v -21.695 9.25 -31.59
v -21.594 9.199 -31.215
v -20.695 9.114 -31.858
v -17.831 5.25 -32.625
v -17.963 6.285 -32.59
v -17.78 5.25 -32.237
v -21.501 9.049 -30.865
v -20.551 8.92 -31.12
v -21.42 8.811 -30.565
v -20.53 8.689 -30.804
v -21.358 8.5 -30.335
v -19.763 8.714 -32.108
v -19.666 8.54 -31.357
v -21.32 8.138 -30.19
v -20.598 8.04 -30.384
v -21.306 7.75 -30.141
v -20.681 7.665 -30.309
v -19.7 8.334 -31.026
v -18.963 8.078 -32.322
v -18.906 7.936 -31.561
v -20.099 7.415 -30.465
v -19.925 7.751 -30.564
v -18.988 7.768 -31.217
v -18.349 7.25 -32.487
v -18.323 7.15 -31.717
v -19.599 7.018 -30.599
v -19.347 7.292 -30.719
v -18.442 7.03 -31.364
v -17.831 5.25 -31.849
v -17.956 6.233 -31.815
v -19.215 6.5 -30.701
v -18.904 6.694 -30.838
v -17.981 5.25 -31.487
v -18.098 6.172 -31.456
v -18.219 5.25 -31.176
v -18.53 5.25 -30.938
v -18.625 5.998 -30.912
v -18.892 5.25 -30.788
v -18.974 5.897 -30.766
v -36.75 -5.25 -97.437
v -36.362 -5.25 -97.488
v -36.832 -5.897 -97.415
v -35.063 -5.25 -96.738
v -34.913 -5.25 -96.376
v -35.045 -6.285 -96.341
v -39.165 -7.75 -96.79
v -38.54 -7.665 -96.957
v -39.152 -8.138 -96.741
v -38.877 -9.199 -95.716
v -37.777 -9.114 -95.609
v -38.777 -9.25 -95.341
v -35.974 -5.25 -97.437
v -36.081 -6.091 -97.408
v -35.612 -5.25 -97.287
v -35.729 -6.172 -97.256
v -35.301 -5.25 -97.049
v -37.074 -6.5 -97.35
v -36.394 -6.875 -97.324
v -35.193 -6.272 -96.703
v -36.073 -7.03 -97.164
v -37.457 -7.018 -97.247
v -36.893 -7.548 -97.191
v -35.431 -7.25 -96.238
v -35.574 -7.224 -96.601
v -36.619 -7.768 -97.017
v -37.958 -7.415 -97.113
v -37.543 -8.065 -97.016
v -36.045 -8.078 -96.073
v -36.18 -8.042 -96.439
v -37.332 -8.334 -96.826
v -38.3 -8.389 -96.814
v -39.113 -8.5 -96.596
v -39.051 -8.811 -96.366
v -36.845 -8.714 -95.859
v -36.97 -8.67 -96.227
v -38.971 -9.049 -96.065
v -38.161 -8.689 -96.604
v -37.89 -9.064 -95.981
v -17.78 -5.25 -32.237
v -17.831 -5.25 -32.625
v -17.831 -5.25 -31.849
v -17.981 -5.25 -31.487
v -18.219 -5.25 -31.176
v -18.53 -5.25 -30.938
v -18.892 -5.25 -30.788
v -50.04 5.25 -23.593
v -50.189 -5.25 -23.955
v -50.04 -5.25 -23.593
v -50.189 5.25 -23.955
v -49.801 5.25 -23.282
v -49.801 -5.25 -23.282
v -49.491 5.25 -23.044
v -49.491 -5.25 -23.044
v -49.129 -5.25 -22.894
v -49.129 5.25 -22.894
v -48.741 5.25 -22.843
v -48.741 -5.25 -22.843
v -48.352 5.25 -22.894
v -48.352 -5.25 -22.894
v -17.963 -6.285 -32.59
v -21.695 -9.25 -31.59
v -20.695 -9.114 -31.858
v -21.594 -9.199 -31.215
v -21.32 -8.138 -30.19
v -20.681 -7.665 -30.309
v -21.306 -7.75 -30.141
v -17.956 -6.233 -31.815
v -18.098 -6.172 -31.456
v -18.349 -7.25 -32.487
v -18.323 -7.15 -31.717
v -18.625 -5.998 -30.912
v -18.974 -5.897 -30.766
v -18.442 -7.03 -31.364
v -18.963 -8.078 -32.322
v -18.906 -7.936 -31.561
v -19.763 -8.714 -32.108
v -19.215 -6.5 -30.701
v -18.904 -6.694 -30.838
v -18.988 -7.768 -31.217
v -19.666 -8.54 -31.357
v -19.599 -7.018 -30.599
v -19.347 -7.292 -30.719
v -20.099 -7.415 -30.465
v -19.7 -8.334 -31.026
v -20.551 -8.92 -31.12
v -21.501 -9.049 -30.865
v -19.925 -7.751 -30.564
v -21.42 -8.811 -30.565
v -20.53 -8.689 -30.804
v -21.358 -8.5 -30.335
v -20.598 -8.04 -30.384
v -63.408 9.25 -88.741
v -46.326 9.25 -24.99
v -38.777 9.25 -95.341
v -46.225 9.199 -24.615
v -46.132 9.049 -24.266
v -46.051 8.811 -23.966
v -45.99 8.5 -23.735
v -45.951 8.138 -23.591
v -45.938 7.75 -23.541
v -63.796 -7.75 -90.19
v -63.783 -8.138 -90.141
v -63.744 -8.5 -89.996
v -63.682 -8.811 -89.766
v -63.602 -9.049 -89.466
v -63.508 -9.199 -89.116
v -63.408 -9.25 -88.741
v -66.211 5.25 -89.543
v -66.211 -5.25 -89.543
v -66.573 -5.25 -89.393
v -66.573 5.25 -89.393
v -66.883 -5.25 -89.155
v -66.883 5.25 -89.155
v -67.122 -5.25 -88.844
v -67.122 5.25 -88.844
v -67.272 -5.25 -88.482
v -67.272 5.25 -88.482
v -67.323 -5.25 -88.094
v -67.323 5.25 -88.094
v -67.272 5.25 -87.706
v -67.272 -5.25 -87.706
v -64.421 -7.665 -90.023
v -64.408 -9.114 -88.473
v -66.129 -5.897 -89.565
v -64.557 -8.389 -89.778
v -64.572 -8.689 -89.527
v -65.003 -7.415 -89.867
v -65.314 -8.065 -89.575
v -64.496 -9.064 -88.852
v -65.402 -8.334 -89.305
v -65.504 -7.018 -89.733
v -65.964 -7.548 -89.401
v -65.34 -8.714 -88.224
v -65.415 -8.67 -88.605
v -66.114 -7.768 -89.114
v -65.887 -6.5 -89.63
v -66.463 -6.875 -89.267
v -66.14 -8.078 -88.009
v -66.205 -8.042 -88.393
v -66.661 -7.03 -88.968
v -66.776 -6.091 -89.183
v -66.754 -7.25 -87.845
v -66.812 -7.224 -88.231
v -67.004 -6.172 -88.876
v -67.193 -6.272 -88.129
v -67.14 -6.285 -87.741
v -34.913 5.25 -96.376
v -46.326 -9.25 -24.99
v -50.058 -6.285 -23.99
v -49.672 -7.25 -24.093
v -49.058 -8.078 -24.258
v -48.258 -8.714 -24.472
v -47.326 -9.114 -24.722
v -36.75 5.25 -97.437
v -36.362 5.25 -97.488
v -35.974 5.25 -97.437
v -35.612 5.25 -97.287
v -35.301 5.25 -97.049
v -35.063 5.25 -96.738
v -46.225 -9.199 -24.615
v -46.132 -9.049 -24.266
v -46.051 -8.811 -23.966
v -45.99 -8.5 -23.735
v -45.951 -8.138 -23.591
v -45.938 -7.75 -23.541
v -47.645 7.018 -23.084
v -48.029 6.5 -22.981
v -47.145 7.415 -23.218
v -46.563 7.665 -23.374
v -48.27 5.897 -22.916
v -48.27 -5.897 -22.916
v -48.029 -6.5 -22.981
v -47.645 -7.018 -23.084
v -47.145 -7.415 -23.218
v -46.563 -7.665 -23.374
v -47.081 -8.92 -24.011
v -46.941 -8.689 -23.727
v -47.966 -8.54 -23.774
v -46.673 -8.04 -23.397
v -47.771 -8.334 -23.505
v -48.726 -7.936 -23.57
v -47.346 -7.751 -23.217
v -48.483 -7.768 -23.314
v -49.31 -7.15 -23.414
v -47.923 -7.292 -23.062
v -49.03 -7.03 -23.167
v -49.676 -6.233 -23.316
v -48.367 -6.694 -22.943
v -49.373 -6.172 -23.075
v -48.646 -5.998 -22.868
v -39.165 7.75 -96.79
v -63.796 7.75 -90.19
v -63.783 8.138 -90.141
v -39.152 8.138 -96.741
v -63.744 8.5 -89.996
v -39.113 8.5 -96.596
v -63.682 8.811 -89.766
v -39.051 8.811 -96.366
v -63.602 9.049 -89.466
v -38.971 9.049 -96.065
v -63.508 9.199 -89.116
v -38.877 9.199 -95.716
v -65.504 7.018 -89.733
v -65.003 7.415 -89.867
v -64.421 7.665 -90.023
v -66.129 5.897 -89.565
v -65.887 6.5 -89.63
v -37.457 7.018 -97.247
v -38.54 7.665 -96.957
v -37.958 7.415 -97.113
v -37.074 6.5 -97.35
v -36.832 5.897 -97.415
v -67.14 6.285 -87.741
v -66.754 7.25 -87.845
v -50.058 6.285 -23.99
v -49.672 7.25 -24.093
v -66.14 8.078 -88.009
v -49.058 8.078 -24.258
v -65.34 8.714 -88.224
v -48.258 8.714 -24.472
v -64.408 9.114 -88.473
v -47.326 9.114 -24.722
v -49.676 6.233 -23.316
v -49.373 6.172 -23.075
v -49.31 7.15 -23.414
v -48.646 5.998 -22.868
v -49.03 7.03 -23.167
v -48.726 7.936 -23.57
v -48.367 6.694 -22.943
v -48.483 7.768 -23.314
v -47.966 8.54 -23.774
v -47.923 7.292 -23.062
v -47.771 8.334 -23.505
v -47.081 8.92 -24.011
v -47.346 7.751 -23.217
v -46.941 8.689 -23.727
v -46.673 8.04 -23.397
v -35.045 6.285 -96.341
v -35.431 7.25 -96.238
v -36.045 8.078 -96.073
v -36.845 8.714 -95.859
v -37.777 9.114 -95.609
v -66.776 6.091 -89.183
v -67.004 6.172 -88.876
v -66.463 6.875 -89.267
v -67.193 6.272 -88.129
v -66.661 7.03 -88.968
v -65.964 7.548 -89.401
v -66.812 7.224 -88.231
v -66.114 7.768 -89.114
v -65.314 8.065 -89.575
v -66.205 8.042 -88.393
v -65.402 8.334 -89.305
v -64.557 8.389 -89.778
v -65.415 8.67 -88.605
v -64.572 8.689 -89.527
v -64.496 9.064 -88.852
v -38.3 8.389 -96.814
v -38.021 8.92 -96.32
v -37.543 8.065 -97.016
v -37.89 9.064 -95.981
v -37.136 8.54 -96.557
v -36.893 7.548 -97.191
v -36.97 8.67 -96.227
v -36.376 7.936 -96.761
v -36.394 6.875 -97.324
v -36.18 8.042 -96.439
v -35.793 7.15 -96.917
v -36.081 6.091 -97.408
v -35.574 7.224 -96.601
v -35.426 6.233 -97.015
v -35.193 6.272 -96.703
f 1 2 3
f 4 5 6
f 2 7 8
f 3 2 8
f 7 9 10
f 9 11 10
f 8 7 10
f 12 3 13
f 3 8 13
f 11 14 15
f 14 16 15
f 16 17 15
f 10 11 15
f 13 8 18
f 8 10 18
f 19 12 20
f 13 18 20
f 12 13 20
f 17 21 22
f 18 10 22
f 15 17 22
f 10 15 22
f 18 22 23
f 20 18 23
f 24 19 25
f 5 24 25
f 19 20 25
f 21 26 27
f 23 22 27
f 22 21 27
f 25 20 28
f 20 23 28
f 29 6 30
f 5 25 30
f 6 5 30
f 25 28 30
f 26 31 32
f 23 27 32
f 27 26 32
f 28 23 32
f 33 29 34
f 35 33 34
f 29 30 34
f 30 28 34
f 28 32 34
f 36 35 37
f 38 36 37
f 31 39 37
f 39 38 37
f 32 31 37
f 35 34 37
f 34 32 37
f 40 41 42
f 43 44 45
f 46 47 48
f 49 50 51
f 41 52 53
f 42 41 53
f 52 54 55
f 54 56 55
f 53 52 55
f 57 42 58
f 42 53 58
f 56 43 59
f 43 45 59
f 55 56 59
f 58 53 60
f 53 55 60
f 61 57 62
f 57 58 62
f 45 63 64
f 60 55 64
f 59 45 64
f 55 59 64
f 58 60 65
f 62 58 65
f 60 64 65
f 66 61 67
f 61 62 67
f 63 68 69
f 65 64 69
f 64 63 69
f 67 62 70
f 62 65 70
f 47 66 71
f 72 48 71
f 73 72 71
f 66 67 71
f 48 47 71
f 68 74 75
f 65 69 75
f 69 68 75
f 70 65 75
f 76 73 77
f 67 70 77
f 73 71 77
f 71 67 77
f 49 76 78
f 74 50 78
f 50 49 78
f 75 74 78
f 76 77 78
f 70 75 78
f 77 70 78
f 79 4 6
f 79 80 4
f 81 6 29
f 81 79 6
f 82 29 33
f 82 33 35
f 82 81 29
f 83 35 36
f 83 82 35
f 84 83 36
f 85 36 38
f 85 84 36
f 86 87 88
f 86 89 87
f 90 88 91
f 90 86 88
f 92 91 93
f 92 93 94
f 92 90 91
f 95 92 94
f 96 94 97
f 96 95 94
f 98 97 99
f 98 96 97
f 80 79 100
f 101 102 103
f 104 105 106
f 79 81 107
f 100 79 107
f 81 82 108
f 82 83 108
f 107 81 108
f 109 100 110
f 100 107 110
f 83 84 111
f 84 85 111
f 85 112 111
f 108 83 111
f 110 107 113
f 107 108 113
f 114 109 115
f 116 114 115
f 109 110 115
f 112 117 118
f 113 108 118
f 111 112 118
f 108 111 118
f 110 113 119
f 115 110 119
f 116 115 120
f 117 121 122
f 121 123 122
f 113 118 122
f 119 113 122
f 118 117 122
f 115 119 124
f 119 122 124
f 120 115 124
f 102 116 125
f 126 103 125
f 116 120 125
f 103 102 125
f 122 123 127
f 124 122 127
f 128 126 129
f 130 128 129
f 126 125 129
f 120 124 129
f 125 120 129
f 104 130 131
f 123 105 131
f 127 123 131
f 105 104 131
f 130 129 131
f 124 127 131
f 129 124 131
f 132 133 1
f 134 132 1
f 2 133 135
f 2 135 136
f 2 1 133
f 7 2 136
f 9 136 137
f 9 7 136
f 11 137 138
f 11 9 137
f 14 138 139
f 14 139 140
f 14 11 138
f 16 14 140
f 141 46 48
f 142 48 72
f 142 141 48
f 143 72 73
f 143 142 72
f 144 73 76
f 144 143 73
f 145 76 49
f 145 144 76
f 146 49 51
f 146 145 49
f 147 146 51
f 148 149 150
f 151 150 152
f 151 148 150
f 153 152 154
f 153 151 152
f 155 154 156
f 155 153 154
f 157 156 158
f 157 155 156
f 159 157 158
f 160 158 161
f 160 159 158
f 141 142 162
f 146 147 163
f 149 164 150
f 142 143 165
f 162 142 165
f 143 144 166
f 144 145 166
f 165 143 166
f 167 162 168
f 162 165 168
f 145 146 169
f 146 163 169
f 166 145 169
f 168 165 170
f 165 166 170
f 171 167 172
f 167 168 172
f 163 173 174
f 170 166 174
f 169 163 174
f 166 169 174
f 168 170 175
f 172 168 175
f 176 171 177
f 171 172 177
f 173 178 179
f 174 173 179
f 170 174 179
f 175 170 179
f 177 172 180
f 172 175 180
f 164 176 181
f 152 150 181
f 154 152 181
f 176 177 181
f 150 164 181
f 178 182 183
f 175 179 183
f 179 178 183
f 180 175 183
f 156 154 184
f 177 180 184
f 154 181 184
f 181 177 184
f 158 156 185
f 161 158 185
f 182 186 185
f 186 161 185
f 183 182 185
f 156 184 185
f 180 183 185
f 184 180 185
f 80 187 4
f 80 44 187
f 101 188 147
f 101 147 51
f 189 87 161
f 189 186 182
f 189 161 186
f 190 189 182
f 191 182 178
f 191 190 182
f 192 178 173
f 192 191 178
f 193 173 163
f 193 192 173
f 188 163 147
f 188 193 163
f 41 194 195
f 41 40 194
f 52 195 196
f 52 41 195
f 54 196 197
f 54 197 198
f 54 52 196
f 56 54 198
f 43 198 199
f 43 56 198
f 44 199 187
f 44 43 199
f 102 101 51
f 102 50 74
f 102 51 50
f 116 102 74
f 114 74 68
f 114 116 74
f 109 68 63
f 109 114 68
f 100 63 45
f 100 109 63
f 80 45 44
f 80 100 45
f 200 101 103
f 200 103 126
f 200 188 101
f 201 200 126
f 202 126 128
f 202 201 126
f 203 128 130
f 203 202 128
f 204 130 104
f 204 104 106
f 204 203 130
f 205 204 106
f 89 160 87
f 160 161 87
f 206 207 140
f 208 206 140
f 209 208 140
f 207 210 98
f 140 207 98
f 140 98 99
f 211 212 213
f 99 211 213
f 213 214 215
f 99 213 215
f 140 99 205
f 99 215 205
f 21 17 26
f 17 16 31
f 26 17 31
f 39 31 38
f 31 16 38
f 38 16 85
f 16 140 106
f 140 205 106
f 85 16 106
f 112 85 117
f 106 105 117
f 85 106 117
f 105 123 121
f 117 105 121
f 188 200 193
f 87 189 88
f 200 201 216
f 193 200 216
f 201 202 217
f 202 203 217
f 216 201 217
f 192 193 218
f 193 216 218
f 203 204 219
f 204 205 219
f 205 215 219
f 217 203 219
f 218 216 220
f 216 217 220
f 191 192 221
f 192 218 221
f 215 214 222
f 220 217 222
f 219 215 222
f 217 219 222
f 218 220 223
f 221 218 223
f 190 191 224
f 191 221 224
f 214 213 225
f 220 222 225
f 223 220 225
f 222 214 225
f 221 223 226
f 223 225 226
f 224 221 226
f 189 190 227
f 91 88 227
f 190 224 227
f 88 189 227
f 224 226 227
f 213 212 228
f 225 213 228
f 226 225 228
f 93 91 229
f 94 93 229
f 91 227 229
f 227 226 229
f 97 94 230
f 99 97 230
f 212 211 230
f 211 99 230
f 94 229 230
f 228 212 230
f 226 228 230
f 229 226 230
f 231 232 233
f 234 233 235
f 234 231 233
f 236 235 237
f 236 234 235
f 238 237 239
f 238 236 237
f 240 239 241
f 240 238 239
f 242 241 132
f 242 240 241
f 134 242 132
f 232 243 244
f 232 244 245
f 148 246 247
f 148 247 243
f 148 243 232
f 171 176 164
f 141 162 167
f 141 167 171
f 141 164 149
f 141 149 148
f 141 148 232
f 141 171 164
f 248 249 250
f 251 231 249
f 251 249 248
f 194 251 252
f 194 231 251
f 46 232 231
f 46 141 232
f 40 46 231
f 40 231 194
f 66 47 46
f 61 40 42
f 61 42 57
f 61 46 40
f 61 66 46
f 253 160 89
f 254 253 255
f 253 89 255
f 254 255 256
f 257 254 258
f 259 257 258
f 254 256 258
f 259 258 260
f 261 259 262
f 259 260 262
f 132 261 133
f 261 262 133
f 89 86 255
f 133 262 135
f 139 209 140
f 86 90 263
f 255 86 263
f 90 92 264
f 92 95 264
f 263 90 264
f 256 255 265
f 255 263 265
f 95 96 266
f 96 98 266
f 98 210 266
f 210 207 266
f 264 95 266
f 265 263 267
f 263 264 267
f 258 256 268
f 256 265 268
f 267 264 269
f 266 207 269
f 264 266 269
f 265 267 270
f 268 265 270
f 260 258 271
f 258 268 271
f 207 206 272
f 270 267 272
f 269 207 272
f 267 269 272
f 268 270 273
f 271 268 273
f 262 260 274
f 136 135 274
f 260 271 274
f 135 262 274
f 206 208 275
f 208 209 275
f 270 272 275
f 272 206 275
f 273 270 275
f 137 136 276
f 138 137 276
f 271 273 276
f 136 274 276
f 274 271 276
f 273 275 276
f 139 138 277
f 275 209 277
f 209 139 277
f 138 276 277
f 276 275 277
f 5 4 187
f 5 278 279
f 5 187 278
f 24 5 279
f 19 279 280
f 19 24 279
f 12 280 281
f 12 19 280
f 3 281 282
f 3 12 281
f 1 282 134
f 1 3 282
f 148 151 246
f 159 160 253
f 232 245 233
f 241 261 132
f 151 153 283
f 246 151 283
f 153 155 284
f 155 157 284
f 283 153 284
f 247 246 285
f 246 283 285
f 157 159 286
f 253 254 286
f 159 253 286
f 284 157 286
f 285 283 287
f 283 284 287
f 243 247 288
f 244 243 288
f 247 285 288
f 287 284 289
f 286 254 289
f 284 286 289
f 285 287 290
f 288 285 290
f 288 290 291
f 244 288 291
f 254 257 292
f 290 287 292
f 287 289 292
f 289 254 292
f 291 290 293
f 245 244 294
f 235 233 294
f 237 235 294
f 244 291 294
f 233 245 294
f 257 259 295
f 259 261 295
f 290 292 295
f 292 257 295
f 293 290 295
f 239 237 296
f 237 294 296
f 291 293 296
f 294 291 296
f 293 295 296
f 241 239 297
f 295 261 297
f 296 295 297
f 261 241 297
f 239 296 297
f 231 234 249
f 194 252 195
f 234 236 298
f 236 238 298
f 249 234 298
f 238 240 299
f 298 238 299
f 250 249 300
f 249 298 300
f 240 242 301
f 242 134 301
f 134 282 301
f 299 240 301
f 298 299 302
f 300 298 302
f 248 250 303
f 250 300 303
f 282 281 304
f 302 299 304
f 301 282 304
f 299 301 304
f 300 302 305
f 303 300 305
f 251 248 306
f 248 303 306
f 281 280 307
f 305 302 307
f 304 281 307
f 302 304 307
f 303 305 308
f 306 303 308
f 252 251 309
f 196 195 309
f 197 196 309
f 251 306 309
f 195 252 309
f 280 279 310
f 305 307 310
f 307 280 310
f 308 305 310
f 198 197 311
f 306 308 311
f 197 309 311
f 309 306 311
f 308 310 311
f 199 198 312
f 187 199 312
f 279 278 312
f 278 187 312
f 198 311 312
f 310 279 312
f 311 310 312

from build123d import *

# Parameters (mm, degrees)
SKETCH_W             = 33.5
SKETCH_H             = 69
PAD_DEPTH            = 9.25
FILLET_R             = 4
FILLET001_R          = 1.5
BODY_PLACEMENT_ANGLE = 15


with BuildPart() as part:
    # Sketch → Pad (new body, symmetric)
    with BuildSketch(Plane.XZ):
        Rectangle(SKETCH_W, SKETCH_H)
    extrude(amount=PAD_DEPTH, both=True)

    # Fillet
    fillet_edges = [part.edges().sort_by_distance(p)[0] for p in [
        (-16.75, -9.25, 0),
        (-16.75, 9.25, 0),
        (16.75, -9.25, 0),
        (16.75, 9.25, 0),
    ]]
    fillet(fillet_edges, radius=FILLET_R)

    # Fillet001
    fillet001_edges = [part.edges().sort_by_distance(p)[0] for p in [
        (-16.75, 0, 34.5),
        (-15.578427, 8.078427, 34.5),
        (-15.578427, -8.078427, 34.5),
        (0, 9.25, 34.5),
        (0, -9.25, 34.5),
        (15.578427, 8.078427, 34.5),
        (15.578427, -8.078427, 34.5),
        (16.75, 0, 34.5),
        (16.75, 0, -34.5),
        (15.578427, 8.078427, -34.5),
        (15.578427, -8.078427, -34.5),
        (0, 9.25, -34.5),
        (0, -9.25, -34.5),
        (-15.578427, 8.078427, -34.5),
        (-15.578427, -8.078427, -34.5),
        (-16.75, 0, -34.5),
    ]]
    fillet(fillet001_edges, radius=FILLET001_R)


with BuildPart() as part_1:
    # Body placement: moved
    add(part.part.moved(Location((-42.5512320173, 0, -60.1655412245))).rotate(Axis((-42.5512320173, 0, -60.1655412245), (0, 1, 0)), BODY_PLACEMENT_ANGLE))


solid = part_1.part
